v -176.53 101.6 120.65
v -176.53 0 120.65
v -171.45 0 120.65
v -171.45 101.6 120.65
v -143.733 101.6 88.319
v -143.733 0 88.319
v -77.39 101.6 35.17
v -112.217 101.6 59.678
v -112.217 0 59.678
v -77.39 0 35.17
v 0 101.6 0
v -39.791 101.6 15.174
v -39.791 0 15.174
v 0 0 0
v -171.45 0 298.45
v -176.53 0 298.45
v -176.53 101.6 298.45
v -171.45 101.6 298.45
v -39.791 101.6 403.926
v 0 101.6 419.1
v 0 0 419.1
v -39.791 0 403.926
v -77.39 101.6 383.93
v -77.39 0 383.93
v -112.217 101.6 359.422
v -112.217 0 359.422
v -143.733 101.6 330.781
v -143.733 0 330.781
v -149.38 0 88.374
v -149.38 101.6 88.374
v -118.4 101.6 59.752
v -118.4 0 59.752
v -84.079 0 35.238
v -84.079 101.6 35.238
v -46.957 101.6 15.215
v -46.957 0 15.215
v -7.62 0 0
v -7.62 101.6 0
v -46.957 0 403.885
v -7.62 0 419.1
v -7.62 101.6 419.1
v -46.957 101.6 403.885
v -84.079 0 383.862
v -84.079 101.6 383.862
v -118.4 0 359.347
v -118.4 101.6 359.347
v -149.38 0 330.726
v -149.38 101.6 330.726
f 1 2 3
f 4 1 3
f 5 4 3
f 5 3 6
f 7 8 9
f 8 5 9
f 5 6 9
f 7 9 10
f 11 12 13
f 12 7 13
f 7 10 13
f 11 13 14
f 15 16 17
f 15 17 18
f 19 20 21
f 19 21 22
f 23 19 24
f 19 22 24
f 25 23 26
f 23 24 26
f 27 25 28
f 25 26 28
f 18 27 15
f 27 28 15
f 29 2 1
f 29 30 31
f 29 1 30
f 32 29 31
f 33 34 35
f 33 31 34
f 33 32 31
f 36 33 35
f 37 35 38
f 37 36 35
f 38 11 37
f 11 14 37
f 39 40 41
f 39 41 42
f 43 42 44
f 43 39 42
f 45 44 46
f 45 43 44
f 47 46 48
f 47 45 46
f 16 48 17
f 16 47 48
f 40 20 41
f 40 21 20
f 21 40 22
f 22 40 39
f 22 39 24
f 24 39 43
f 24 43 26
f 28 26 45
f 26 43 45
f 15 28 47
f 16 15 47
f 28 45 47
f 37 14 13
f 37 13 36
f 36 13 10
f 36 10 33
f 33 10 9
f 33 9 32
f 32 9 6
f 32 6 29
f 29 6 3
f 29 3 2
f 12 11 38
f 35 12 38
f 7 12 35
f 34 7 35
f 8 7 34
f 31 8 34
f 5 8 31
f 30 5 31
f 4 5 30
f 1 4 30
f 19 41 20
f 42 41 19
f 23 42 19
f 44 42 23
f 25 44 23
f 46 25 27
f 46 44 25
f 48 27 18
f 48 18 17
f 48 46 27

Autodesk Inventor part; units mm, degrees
ref_plane "YZ Plane" through (0, 0, 0) normal (1, 0, 0) x (0, 1, 0)
ref_plane "XZ Plane" through (0, 0, 0) normal (0, 1, 0) x (-1, 0, 0)
ref_plane "XY Plane" through (0, 0, 0) normal (0, 0, 1) x (1, 0, 0)
sketch "Sketch1" plane through (0, 0, 0) normal (0, 1, 0) x (-1, 0, 0)
  line L0 (0, 0) -> (0, 419.1) construction
  line L1 (-20.1749, 209.55) -> (-20.1749, 298.45) construction
  line L2 (-20.1749, 298.45) -> (-20.1749, 120.65) construction
  line L3 (0, 459.8887) -> (176.53, 459.8887) construction
  arc A0 (176.53, 298.45) -> (7.62, 419.1) centre (-93.6939, 98.6985) ccw
  line L4 (0, 419.1) -> (7.62, 419.1)
  line L5 (176.53, 298.45) -> (171.45, 298.45)
  arc A1 (171.45, 298.45) -> (0, 419.1) centre (-101.8864, 92.1694) ccw
  line L6 (-14.6934, 209.55) -> (-6.0543, 209.55)
  arc A2 (7.62, 0) -> (176.53, 120.65) centre (-93.6939, 320.4015) ccw
  line L7 (0, 0) -> (7.62, 0)
  line L8 (176.53, 120.65) -> (171.45, 120.65)
  arc A3 (0, 0) -> (171.45, 120.65) centre (-101.8864, 326.9306) ccw
  dimension "d0" = 419.1
  dimension "d1" = 88.9
  dimension "d2" = 177.8
  dimension "d3" = 176.53
  dimension "d4" = 7.62
  dimension "d5" = 5.08
extrude "Extrusion1" add sketch "Sketch1" along normal blind 101.6
equation "\"BendRadius\" = Thickness"
equation "\"BendReliefWidth\" = Thickness"
equation "\"BendReliefDepth\" = 0.5 * Thickness"
equation "\"CornerReliefSize\" = 4 * Thickness"
equation "\"MinimumRemnant\" = 2 * Thickness"
equation "\"TransitionRadius\" = BendRadius"
equation "\"JacobiRadiusSize\" = BendRadius"
equation "\"GapSize\" = Thickness"
equation "\"Thickness\" = 3.048"
properties part number "Funnel"
